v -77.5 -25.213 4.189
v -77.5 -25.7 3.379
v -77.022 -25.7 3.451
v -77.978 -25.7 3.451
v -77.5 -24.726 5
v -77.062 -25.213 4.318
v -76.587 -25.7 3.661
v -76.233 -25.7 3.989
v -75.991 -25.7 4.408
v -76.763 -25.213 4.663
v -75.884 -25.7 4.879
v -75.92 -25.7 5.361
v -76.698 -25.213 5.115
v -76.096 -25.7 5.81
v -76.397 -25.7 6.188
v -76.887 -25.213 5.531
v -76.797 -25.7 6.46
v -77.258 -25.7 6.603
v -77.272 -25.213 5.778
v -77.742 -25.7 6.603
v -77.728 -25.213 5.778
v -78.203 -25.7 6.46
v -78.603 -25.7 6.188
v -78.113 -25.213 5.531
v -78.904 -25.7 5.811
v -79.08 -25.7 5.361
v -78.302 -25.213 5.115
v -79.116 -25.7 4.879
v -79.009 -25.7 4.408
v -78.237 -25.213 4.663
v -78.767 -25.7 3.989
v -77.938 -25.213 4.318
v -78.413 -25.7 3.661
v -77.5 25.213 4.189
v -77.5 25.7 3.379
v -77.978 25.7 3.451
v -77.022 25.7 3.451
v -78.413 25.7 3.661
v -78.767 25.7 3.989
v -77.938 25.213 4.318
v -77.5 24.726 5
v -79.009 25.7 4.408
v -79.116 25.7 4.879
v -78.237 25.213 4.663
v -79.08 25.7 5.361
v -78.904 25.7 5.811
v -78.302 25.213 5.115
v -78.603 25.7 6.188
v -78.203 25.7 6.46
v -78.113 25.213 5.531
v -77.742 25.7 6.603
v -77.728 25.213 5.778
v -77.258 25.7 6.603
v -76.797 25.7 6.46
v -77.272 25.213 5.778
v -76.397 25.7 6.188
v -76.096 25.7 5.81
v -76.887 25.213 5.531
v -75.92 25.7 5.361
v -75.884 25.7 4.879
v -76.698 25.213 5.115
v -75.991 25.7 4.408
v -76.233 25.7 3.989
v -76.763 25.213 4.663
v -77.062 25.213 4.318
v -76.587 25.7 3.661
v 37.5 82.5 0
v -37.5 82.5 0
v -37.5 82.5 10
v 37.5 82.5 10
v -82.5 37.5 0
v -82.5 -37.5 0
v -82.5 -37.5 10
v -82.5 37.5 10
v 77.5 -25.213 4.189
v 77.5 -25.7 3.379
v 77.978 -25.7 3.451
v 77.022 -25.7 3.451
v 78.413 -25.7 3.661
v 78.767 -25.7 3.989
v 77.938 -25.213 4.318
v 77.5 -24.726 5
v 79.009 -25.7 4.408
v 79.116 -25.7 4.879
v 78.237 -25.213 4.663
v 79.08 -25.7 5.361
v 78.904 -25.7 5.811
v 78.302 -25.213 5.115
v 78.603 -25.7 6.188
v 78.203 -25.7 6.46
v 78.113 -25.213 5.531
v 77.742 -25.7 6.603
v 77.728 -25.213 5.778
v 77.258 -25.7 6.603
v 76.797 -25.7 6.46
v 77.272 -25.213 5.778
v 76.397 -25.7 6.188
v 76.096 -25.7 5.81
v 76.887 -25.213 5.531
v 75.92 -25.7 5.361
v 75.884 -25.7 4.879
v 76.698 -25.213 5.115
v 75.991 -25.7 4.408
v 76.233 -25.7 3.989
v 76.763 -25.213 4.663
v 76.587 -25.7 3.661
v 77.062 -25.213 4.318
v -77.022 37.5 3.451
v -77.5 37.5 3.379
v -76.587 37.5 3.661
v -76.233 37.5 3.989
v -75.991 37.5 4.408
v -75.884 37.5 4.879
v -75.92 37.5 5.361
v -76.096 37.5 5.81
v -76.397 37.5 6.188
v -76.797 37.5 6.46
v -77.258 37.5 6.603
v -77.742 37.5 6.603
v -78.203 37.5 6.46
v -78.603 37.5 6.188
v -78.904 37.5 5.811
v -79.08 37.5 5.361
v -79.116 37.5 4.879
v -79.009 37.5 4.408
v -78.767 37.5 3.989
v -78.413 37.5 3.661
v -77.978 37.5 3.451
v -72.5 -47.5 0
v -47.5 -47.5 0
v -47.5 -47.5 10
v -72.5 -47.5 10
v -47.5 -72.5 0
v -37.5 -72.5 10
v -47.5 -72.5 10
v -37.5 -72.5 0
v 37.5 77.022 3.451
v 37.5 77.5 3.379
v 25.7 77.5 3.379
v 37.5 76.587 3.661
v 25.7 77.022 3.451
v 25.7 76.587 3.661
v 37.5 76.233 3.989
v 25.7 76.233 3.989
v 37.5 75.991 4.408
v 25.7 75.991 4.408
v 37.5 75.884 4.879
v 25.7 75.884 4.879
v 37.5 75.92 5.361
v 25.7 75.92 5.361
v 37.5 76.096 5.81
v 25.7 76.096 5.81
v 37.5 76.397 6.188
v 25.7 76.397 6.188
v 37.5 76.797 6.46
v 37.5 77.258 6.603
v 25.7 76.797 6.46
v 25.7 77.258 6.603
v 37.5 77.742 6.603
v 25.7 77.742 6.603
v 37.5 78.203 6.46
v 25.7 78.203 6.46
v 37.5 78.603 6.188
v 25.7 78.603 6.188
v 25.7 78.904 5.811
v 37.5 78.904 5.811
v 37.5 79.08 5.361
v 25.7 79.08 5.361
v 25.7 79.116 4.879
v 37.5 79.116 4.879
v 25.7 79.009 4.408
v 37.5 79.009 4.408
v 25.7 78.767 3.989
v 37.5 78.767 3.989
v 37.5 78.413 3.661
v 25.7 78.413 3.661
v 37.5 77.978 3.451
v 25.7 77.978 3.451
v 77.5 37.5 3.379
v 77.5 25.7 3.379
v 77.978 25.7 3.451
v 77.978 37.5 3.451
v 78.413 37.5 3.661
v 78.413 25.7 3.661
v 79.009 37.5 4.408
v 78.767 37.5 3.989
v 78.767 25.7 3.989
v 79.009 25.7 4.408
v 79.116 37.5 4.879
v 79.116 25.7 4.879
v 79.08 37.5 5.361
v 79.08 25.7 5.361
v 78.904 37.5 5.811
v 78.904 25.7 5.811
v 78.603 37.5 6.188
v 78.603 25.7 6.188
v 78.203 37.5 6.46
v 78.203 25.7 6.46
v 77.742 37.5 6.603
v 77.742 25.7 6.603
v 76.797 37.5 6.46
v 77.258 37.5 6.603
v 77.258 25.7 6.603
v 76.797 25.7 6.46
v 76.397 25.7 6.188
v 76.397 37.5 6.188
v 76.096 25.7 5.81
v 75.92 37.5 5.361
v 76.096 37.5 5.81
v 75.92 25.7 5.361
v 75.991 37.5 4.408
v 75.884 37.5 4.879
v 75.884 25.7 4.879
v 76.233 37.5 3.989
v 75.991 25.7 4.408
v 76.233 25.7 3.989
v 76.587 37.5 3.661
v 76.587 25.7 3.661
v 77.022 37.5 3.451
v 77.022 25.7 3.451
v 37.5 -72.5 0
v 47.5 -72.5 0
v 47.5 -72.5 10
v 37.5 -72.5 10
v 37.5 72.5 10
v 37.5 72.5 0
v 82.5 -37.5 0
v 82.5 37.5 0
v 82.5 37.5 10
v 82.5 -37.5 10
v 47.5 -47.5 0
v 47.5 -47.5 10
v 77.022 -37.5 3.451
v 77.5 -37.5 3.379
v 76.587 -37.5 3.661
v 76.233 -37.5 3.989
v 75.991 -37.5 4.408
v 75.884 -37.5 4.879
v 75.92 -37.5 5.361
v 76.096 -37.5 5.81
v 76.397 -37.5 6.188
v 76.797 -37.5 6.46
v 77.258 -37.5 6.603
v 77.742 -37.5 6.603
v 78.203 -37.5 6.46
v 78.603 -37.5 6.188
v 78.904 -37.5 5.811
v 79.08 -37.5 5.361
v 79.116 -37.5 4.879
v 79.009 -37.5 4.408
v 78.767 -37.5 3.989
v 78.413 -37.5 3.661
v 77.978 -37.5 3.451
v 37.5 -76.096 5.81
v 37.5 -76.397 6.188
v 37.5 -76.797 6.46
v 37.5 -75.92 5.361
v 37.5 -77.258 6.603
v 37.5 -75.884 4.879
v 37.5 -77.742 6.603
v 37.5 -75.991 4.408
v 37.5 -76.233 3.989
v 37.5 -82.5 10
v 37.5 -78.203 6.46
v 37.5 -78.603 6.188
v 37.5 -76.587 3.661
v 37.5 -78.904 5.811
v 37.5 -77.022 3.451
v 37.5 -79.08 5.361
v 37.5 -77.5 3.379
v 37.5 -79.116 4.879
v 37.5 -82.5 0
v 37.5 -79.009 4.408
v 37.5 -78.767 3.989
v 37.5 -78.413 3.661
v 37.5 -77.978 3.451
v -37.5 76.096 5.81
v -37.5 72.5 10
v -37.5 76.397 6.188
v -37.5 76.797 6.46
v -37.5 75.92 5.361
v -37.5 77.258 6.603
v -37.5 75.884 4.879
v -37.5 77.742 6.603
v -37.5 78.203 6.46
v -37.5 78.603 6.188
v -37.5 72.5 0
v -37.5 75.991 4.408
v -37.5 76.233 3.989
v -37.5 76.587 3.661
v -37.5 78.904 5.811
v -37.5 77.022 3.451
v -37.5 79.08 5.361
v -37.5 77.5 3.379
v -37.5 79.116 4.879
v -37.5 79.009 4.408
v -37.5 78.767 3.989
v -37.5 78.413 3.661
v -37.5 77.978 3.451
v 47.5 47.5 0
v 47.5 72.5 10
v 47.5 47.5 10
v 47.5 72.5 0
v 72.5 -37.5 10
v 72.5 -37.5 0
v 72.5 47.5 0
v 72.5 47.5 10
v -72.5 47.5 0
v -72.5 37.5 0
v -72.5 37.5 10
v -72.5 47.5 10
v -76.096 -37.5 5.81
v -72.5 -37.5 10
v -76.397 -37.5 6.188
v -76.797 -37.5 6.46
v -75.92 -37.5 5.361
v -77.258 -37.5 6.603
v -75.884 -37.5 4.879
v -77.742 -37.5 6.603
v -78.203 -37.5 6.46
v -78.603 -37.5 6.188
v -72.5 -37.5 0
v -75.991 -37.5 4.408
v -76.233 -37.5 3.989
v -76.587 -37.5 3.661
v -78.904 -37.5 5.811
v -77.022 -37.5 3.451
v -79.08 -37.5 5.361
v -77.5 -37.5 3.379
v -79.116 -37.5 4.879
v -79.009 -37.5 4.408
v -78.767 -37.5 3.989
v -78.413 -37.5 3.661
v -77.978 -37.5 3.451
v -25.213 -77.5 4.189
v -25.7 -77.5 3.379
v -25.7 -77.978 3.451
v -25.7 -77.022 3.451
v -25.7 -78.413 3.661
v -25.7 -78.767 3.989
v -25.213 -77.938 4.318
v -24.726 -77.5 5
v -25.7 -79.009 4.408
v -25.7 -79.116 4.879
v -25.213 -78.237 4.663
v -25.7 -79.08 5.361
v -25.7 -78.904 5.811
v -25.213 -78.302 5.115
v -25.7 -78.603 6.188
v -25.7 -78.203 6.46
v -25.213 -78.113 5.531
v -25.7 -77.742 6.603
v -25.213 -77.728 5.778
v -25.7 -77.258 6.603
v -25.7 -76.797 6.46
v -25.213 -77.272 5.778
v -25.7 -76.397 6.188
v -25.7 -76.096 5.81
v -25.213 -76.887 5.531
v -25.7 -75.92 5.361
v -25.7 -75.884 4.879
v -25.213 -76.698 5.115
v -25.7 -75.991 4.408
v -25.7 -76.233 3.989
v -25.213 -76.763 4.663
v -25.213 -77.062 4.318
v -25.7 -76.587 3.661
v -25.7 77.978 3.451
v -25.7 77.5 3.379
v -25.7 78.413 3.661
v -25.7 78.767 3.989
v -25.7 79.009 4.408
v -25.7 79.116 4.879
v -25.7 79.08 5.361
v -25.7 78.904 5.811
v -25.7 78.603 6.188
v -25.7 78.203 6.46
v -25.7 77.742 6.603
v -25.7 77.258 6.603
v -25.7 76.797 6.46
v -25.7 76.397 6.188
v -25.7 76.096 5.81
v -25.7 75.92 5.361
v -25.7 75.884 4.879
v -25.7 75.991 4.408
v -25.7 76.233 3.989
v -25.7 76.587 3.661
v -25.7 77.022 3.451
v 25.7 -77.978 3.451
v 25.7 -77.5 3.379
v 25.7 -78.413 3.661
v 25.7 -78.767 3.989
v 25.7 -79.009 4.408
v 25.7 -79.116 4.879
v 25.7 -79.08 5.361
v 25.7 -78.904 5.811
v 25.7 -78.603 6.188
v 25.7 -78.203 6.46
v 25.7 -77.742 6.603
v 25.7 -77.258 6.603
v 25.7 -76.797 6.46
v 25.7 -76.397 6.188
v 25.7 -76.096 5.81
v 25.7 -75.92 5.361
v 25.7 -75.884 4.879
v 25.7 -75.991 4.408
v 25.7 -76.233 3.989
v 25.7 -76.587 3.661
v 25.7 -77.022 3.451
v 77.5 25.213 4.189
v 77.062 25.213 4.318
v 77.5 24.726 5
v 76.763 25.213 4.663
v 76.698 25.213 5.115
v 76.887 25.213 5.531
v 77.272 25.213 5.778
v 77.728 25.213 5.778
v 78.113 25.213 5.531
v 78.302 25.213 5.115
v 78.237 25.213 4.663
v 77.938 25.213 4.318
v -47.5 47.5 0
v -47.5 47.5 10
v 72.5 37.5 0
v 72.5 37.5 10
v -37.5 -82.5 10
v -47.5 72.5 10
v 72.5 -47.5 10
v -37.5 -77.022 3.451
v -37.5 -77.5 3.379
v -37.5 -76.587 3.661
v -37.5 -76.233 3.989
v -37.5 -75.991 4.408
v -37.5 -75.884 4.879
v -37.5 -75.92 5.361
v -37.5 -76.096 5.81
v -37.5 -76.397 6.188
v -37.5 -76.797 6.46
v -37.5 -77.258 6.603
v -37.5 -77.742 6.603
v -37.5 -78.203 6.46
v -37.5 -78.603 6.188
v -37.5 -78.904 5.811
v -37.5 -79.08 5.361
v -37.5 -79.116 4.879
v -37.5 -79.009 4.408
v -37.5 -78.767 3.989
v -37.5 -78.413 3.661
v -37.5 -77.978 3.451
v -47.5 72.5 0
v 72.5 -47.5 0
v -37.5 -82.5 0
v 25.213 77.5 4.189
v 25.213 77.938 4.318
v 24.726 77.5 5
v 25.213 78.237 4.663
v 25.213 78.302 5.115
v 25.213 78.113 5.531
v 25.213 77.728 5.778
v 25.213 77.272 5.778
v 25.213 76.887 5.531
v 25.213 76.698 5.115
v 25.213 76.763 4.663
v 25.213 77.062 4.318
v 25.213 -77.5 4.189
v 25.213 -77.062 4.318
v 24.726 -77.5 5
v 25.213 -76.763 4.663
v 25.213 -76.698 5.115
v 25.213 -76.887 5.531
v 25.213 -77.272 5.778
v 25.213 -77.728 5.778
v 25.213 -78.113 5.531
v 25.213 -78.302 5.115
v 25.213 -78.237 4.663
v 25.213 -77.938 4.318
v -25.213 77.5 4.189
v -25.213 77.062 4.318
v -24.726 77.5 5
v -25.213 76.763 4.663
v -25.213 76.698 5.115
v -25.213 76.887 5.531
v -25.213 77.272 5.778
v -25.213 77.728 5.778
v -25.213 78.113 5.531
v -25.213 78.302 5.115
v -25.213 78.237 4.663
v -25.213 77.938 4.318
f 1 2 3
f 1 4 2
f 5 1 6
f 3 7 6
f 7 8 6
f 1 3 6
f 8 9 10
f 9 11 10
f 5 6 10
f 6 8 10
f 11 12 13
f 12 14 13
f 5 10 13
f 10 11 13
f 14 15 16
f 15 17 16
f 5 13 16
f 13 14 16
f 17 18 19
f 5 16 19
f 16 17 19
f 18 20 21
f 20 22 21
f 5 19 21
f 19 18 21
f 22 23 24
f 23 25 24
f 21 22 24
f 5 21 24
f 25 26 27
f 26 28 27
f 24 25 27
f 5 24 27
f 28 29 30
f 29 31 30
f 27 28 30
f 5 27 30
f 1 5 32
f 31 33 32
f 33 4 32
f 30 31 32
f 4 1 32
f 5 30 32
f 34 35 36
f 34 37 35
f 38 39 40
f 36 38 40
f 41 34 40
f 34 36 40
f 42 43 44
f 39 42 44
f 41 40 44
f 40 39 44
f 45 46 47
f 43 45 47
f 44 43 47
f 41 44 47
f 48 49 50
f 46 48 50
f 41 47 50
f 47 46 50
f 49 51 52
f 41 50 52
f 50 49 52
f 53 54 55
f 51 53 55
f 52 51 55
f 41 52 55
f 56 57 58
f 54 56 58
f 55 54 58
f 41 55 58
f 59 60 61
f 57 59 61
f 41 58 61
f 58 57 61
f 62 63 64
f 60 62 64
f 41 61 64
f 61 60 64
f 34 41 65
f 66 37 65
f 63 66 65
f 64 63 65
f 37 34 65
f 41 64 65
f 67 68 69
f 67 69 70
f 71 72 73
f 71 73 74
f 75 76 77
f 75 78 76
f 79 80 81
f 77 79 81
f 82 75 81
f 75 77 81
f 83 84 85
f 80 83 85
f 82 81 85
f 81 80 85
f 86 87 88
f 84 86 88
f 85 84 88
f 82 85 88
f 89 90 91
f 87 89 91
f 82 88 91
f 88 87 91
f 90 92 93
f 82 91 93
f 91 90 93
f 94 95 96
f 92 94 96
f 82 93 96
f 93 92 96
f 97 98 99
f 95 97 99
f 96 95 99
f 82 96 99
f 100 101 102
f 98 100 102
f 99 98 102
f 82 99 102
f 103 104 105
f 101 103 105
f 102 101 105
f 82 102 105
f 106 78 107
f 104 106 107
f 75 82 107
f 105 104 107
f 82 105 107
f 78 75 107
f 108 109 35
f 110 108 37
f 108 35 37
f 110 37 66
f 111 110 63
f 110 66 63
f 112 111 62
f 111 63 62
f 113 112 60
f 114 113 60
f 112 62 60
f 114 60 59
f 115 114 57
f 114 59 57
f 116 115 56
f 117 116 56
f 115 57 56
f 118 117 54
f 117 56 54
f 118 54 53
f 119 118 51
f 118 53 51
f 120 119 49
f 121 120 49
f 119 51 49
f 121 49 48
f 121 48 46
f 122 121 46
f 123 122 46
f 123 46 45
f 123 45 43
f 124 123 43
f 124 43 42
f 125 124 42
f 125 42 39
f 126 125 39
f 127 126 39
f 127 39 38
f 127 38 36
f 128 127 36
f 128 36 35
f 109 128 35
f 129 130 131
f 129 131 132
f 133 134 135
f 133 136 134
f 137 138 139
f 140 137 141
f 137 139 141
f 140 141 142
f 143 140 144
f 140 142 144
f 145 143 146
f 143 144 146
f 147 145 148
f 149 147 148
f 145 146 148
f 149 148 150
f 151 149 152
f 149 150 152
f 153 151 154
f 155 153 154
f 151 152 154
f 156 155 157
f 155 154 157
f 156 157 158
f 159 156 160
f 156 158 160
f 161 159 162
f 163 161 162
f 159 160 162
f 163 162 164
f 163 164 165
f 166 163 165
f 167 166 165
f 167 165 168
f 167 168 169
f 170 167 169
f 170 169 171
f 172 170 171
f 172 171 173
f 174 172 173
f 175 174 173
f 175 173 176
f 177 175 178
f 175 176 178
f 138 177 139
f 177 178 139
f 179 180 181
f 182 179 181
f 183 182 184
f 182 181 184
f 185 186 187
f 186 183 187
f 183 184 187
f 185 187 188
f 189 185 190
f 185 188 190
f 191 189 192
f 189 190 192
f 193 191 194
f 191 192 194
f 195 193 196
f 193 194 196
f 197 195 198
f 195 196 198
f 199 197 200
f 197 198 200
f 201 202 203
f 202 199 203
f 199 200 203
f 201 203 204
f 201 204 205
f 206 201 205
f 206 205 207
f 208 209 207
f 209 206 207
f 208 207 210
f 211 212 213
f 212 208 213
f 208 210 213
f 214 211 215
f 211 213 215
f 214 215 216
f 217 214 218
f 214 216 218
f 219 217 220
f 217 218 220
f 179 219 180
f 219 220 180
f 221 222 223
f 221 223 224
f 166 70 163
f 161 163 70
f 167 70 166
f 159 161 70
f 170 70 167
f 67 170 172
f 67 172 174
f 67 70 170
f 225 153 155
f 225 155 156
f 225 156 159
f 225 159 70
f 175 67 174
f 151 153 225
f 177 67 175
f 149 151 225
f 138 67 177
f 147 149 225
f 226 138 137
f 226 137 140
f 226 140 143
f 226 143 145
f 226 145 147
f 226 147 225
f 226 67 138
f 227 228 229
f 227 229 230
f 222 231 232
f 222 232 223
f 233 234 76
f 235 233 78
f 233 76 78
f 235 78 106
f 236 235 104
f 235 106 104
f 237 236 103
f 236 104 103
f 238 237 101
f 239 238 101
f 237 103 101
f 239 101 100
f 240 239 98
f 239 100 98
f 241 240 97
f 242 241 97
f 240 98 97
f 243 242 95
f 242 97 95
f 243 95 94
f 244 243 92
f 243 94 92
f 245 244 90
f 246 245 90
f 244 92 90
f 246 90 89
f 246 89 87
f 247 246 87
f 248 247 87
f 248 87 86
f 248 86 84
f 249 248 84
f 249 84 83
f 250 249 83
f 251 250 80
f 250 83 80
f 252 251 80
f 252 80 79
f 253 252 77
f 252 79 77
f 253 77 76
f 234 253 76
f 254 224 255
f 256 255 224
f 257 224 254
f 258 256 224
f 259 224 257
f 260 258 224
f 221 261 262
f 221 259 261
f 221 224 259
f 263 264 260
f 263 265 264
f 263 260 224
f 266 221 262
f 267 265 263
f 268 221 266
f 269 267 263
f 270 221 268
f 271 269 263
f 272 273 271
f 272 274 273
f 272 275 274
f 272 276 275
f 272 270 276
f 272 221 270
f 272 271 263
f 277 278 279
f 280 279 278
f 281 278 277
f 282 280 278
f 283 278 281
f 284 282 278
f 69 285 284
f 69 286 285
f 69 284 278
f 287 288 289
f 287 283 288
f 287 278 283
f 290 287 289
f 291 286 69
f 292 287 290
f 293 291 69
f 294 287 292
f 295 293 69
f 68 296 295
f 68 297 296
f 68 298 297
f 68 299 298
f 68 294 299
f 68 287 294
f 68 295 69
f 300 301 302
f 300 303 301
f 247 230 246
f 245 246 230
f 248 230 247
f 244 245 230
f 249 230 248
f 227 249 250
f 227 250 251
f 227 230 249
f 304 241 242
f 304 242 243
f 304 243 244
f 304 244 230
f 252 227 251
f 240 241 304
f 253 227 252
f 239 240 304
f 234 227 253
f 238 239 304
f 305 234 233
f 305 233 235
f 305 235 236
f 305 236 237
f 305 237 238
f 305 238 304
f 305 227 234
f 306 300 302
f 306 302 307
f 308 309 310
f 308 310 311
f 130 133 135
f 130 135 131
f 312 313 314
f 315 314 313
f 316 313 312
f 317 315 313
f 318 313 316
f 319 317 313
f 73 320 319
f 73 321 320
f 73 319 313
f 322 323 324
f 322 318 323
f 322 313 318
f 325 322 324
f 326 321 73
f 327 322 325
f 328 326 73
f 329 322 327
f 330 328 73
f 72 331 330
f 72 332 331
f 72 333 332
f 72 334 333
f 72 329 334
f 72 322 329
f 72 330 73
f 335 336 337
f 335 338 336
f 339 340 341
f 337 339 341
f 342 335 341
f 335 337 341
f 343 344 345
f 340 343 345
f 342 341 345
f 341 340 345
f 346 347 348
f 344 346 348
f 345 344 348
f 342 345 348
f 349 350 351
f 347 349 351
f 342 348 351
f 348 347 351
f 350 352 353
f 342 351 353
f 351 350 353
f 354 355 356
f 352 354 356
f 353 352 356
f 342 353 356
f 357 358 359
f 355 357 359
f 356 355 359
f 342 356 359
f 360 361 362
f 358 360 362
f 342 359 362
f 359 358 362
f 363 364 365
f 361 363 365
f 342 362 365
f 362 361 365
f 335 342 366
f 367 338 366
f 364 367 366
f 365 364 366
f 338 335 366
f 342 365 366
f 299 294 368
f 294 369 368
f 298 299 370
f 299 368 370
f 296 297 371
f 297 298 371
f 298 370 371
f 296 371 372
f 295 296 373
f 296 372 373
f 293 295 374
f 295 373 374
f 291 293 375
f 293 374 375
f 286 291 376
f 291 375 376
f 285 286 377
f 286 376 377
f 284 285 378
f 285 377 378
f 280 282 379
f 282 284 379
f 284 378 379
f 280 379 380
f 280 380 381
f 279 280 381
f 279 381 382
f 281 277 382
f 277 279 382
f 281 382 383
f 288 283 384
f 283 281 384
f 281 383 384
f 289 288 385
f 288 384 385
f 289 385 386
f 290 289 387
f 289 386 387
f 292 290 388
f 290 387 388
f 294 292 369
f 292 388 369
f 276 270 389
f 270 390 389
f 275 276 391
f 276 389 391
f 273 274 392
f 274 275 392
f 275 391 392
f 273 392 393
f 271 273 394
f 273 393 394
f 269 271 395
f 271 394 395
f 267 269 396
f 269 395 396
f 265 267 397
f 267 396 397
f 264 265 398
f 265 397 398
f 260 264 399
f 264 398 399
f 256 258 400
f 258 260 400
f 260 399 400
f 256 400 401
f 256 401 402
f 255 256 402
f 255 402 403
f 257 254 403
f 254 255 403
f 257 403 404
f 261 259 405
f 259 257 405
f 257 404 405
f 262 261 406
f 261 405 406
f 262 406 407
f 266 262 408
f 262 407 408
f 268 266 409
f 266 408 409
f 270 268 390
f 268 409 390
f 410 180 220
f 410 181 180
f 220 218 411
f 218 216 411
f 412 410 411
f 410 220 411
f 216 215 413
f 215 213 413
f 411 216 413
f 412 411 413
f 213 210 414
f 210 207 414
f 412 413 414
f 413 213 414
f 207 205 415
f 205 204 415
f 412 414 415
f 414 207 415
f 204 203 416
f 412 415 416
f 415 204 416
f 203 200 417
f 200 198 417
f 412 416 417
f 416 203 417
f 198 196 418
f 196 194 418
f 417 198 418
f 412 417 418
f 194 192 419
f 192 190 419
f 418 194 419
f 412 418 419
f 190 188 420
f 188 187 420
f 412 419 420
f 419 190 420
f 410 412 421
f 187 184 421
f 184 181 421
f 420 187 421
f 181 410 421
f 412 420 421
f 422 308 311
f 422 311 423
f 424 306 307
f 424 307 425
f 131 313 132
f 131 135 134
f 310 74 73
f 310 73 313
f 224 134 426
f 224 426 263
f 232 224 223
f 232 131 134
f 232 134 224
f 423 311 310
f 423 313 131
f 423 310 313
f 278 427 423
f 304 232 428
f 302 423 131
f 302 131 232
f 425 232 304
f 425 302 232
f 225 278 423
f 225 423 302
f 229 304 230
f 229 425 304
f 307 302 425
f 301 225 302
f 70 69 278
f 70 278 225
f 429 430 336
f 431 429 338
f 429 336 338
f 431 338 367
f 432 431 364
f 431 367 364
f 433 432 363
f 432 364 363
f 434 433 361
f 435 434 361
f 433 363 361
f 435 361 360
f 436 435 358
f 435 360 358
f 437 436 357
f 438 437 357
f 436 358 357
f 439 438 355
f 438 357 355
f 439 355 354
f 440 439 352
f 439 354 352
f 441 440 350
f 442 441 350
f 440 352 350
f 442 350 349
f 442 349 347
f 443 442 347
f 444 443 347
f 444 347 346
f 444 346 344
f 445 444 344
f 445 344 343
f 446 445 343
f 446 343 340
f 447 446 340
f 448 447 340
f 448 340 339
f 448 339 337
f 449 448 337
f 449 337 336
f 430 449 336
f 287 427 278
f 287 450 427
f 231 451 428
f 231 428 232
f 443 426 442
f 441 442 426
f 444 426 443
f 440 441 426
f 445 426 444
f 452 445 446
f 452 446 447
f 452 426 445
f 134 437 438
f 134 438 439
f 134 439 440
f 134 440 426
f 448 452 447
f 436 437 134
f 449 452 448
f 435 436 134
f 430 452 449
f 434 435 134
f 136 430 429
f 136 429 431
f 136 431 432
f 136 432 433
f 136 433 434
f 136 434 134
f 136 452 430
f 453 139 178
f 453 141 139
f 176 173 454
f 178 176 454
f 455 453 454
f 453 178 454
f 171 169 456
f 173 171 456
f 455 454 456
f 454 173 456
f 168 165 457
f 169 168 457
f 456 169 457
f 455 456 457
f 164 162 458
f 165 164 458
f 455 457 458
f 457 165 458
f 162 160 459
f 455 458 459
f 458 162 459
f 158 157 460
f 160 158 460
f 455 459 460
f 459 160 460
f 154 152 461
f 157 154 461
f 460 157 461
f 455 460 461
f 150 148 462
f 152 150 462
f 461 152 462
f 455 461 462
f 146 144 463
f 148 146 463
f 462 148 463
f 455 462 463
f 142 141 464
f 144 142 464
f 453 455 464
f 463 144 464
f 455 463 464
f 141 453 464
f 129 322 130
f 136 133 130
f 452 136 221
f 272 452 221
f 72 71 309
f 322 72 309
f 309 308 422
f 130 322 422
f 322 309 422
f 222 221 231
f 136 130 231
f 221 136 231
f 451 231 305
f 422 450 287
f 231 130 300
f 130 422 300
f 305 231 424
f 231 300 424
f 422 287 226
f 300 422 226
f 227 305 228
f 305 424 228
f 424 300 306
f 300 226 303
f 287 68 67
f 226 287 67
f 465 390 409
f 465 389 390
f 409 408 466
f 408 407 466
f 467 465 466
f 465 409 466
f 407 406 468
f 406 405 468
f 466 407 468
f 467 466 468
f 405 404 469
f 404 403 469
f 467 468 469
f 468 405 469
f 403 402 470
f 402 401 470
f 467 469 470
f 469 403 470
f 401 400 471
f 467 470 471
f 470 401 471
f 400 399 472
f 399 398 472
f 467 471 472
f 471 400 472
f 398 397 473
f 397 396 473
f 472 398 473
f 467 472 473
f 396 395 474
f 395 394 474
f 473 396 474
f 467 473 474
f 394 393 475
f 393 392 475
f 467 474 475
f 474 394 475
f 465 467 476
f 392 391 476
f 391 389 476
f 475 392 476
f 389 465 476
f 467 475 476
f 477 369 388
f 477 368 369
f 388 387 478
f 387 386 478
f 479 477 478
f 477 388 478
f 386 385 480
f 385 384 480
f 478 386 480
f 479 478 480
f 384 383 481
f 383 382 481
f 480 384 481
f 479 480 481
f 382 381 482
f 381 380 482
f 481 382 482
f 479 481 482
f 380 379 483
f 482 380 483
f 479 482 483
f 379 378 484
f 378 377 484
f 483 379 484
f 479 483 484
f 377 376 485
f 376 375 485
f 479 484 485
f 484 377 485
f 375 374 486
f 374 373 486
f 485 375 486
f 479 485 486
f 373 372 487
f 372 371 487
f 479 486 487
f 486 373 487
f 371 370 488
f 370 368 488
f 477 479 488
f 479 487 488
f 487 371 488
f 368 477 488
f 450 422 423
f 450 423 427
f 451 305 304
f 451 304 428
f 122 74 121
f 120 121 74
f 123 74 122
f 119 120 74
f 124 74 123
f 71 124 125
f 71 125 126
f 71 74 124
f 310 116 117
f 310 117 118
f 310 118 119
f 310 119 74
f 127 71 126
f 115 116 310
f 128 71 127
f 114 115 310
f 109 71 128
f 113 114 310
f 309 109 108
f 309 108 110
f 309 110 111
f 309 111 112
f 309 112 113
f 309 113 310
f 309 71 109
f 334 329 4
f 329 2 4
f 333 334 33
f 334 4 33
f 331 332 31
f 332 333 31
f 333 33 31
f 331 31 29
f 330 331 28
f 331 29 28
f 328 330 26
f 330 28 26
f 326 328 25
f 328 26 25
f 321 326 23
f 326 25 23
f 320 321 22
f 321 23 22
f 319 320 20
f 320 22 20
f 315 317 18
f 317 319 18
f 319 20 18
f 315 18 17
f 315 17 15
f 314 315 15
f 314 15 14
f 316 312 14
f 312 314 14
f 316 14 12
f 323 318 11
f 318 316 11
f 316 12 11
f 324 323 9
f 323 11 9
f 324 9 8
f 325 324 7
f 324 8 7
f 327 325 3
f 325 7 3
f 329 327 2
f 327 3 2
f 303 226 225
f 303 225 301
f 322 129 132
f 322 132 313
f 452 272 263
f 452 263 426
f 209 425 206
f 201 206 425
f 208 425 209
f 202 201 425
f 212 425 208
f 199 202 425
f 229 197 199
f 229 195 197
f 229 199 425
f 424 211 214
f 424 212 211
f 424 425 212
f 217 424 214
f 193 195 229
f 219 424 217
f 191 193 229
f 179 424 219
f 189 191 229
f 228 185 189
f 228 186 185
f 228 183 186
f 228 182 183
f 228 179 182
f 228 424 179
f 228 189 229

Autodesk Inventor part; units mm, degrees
ref_plane "YZ Plane" through (0, 0, 0) normal (1, 0, 0) x (0, 1, 0)
ref_plane "XZ Plane" through (0, 0, 0) normal (0, 1, 0) x (-1, 0, 0)
ref_plane "XY Plane" through (0, 0, 0) normal (0, 0, 1) x (1, 0, 0)
sketch "Sketch1" plane through (0, 0, 0) normal (0, 0, 1) x (1, 0, 0)
  line L0 (0, 82.5) -> (37.5, 82.5)
  line L1 (37.5, 82.5) -> (37.5, 72.5)
  line L2 (37.5, 72.5) -> (47.5, 72.5)
  line L3 (0, 101.1294) -> (0, 0)
  line L4 (0, 0) -> (69.4378, 0)
  line L5 (72.5, 47.5) -> (72.5, 37.5)
  line L6 (72.5, 37.5) -> (82.5, 37.5)
  line L7 (82.5, 37.5) -> (82.5, 0)
  line L8 (47.5, 72.5) -> (47.5, 47.5)
  line L9 (47.5, 47.5) -> (72.5, 47.5)
  line L10 (-82.5, 0) -> (-82.5, 37.5)
  line L11 (-82.5, 37.5) -> (-72.5, 37.5)
  line L12 (-72.5, 37.5) -> (-72.5, 47.5)
  line L13 (0, 0) -> (0, 69.4378)
  line L14 (-47.5, 72.5) -> (-37.5, 72.5)
  line L15 (-37.5, 72.5) -> (-37.5, 82.5)
  line L16 (-37.5, 82.5) -> (0, 82.5)
  line L17 (-72.5, 47.5) -> (-47.5, 47.5)
  line L18 (-47.5, 47.5) -> (-47.5, 72.5)
  line L19 (0, -82.5) -> (-37.5, -82.5)
  line L20 (-37.5, -82.5) -> (-37.5, -72.5)
  line L21 (-37.5, -72.5) -> (-47.5, -72.5)
  line L22 (0, 0) -> (-69.4378, 0)
  line L23 (-72.5, -47.5) -> (-72.5, -37.5)
  line L24 (-72.5, -37.5) -> (-82.5, -37.5)
  line L25 (-82.5, -37.5) -> (-82.5, 0)
  line L26 (-47.5, -72.5) -> (-47.5, -47.5)
  line L27 (-47.5, -47.5) -> (-72.5, -47.5)
  line L28 (82.5, 0) -> (82.5, -37.5)
  line L29 (82.5, -37.5) -> (72.5, -37.5)
  line L30 (72.5, -37.5) -> (72.5, -47.5)
  line L31 (0, 0) -> (0, -69.4378)
  line L32 (47.5, -72.5) -> (37.5, -72.5)
  line L33 (37.5, -72.5) -> (37.5, -82.5)
  line L34 (37.5, -82.5) -> (0, -82.5)
  line L35 (72.5, -47.5) -> (47.5, -47.5)
  line L36 (47.5, -47.5) -> (47.5, -72.5)
  point P0 (0, 50.5647)
  point P1 (-50.5647, 0)
  point P2 (0, -50.5647)
  point P3 (50.5647, 0)
  point P4 (82.5, 0)
  dimension "d0" = 75
  dimension "d1" = 165
  dimension "d2" = 10
  dimension "d3" = 10
  dimension "d4" = 165
  dimension "d5" = 75
  dimension "d25" = 10
  dimension "d26" = 10
  dimension "d29" = 360
extrude "Extrusion1" add sketch "Sketch1" along normal blind 10
sketch "Sketch2" plane through (37.5, 72.5, 0) normal (1, 0, 0) x (0, 0, -1)
  circle A0 centre (-5, 5) radius 2
  line L0 (0, 0) -> (0, 10) projected
  line L1 (0, 10) -> (-10, 10) projected
  point P0 (0, -72.5)
  dimension "d12" = 4
  dimension "d13" = 5
  dimension "d14" = 5
hole "Hole1" at (37.5, 77.5, 5) direction (-1, 0, 0) diameter 3.242 depth 11.8 tip angle 118 thread size "M4x0.7" class "6H" standard "ISO Metric profile"
mirror "Mirror1" about plane through (0, 0, 0) normal (1, 0, 0) of "Hole1"
pattern_circular "Circular Pattern1" count 4 over 360 about axis through (0, 0, -10) along (0, 0, 1) of "Hole1", "Mirror1"
properties part number "gearbox_cap" material "PMMA Plastic"
